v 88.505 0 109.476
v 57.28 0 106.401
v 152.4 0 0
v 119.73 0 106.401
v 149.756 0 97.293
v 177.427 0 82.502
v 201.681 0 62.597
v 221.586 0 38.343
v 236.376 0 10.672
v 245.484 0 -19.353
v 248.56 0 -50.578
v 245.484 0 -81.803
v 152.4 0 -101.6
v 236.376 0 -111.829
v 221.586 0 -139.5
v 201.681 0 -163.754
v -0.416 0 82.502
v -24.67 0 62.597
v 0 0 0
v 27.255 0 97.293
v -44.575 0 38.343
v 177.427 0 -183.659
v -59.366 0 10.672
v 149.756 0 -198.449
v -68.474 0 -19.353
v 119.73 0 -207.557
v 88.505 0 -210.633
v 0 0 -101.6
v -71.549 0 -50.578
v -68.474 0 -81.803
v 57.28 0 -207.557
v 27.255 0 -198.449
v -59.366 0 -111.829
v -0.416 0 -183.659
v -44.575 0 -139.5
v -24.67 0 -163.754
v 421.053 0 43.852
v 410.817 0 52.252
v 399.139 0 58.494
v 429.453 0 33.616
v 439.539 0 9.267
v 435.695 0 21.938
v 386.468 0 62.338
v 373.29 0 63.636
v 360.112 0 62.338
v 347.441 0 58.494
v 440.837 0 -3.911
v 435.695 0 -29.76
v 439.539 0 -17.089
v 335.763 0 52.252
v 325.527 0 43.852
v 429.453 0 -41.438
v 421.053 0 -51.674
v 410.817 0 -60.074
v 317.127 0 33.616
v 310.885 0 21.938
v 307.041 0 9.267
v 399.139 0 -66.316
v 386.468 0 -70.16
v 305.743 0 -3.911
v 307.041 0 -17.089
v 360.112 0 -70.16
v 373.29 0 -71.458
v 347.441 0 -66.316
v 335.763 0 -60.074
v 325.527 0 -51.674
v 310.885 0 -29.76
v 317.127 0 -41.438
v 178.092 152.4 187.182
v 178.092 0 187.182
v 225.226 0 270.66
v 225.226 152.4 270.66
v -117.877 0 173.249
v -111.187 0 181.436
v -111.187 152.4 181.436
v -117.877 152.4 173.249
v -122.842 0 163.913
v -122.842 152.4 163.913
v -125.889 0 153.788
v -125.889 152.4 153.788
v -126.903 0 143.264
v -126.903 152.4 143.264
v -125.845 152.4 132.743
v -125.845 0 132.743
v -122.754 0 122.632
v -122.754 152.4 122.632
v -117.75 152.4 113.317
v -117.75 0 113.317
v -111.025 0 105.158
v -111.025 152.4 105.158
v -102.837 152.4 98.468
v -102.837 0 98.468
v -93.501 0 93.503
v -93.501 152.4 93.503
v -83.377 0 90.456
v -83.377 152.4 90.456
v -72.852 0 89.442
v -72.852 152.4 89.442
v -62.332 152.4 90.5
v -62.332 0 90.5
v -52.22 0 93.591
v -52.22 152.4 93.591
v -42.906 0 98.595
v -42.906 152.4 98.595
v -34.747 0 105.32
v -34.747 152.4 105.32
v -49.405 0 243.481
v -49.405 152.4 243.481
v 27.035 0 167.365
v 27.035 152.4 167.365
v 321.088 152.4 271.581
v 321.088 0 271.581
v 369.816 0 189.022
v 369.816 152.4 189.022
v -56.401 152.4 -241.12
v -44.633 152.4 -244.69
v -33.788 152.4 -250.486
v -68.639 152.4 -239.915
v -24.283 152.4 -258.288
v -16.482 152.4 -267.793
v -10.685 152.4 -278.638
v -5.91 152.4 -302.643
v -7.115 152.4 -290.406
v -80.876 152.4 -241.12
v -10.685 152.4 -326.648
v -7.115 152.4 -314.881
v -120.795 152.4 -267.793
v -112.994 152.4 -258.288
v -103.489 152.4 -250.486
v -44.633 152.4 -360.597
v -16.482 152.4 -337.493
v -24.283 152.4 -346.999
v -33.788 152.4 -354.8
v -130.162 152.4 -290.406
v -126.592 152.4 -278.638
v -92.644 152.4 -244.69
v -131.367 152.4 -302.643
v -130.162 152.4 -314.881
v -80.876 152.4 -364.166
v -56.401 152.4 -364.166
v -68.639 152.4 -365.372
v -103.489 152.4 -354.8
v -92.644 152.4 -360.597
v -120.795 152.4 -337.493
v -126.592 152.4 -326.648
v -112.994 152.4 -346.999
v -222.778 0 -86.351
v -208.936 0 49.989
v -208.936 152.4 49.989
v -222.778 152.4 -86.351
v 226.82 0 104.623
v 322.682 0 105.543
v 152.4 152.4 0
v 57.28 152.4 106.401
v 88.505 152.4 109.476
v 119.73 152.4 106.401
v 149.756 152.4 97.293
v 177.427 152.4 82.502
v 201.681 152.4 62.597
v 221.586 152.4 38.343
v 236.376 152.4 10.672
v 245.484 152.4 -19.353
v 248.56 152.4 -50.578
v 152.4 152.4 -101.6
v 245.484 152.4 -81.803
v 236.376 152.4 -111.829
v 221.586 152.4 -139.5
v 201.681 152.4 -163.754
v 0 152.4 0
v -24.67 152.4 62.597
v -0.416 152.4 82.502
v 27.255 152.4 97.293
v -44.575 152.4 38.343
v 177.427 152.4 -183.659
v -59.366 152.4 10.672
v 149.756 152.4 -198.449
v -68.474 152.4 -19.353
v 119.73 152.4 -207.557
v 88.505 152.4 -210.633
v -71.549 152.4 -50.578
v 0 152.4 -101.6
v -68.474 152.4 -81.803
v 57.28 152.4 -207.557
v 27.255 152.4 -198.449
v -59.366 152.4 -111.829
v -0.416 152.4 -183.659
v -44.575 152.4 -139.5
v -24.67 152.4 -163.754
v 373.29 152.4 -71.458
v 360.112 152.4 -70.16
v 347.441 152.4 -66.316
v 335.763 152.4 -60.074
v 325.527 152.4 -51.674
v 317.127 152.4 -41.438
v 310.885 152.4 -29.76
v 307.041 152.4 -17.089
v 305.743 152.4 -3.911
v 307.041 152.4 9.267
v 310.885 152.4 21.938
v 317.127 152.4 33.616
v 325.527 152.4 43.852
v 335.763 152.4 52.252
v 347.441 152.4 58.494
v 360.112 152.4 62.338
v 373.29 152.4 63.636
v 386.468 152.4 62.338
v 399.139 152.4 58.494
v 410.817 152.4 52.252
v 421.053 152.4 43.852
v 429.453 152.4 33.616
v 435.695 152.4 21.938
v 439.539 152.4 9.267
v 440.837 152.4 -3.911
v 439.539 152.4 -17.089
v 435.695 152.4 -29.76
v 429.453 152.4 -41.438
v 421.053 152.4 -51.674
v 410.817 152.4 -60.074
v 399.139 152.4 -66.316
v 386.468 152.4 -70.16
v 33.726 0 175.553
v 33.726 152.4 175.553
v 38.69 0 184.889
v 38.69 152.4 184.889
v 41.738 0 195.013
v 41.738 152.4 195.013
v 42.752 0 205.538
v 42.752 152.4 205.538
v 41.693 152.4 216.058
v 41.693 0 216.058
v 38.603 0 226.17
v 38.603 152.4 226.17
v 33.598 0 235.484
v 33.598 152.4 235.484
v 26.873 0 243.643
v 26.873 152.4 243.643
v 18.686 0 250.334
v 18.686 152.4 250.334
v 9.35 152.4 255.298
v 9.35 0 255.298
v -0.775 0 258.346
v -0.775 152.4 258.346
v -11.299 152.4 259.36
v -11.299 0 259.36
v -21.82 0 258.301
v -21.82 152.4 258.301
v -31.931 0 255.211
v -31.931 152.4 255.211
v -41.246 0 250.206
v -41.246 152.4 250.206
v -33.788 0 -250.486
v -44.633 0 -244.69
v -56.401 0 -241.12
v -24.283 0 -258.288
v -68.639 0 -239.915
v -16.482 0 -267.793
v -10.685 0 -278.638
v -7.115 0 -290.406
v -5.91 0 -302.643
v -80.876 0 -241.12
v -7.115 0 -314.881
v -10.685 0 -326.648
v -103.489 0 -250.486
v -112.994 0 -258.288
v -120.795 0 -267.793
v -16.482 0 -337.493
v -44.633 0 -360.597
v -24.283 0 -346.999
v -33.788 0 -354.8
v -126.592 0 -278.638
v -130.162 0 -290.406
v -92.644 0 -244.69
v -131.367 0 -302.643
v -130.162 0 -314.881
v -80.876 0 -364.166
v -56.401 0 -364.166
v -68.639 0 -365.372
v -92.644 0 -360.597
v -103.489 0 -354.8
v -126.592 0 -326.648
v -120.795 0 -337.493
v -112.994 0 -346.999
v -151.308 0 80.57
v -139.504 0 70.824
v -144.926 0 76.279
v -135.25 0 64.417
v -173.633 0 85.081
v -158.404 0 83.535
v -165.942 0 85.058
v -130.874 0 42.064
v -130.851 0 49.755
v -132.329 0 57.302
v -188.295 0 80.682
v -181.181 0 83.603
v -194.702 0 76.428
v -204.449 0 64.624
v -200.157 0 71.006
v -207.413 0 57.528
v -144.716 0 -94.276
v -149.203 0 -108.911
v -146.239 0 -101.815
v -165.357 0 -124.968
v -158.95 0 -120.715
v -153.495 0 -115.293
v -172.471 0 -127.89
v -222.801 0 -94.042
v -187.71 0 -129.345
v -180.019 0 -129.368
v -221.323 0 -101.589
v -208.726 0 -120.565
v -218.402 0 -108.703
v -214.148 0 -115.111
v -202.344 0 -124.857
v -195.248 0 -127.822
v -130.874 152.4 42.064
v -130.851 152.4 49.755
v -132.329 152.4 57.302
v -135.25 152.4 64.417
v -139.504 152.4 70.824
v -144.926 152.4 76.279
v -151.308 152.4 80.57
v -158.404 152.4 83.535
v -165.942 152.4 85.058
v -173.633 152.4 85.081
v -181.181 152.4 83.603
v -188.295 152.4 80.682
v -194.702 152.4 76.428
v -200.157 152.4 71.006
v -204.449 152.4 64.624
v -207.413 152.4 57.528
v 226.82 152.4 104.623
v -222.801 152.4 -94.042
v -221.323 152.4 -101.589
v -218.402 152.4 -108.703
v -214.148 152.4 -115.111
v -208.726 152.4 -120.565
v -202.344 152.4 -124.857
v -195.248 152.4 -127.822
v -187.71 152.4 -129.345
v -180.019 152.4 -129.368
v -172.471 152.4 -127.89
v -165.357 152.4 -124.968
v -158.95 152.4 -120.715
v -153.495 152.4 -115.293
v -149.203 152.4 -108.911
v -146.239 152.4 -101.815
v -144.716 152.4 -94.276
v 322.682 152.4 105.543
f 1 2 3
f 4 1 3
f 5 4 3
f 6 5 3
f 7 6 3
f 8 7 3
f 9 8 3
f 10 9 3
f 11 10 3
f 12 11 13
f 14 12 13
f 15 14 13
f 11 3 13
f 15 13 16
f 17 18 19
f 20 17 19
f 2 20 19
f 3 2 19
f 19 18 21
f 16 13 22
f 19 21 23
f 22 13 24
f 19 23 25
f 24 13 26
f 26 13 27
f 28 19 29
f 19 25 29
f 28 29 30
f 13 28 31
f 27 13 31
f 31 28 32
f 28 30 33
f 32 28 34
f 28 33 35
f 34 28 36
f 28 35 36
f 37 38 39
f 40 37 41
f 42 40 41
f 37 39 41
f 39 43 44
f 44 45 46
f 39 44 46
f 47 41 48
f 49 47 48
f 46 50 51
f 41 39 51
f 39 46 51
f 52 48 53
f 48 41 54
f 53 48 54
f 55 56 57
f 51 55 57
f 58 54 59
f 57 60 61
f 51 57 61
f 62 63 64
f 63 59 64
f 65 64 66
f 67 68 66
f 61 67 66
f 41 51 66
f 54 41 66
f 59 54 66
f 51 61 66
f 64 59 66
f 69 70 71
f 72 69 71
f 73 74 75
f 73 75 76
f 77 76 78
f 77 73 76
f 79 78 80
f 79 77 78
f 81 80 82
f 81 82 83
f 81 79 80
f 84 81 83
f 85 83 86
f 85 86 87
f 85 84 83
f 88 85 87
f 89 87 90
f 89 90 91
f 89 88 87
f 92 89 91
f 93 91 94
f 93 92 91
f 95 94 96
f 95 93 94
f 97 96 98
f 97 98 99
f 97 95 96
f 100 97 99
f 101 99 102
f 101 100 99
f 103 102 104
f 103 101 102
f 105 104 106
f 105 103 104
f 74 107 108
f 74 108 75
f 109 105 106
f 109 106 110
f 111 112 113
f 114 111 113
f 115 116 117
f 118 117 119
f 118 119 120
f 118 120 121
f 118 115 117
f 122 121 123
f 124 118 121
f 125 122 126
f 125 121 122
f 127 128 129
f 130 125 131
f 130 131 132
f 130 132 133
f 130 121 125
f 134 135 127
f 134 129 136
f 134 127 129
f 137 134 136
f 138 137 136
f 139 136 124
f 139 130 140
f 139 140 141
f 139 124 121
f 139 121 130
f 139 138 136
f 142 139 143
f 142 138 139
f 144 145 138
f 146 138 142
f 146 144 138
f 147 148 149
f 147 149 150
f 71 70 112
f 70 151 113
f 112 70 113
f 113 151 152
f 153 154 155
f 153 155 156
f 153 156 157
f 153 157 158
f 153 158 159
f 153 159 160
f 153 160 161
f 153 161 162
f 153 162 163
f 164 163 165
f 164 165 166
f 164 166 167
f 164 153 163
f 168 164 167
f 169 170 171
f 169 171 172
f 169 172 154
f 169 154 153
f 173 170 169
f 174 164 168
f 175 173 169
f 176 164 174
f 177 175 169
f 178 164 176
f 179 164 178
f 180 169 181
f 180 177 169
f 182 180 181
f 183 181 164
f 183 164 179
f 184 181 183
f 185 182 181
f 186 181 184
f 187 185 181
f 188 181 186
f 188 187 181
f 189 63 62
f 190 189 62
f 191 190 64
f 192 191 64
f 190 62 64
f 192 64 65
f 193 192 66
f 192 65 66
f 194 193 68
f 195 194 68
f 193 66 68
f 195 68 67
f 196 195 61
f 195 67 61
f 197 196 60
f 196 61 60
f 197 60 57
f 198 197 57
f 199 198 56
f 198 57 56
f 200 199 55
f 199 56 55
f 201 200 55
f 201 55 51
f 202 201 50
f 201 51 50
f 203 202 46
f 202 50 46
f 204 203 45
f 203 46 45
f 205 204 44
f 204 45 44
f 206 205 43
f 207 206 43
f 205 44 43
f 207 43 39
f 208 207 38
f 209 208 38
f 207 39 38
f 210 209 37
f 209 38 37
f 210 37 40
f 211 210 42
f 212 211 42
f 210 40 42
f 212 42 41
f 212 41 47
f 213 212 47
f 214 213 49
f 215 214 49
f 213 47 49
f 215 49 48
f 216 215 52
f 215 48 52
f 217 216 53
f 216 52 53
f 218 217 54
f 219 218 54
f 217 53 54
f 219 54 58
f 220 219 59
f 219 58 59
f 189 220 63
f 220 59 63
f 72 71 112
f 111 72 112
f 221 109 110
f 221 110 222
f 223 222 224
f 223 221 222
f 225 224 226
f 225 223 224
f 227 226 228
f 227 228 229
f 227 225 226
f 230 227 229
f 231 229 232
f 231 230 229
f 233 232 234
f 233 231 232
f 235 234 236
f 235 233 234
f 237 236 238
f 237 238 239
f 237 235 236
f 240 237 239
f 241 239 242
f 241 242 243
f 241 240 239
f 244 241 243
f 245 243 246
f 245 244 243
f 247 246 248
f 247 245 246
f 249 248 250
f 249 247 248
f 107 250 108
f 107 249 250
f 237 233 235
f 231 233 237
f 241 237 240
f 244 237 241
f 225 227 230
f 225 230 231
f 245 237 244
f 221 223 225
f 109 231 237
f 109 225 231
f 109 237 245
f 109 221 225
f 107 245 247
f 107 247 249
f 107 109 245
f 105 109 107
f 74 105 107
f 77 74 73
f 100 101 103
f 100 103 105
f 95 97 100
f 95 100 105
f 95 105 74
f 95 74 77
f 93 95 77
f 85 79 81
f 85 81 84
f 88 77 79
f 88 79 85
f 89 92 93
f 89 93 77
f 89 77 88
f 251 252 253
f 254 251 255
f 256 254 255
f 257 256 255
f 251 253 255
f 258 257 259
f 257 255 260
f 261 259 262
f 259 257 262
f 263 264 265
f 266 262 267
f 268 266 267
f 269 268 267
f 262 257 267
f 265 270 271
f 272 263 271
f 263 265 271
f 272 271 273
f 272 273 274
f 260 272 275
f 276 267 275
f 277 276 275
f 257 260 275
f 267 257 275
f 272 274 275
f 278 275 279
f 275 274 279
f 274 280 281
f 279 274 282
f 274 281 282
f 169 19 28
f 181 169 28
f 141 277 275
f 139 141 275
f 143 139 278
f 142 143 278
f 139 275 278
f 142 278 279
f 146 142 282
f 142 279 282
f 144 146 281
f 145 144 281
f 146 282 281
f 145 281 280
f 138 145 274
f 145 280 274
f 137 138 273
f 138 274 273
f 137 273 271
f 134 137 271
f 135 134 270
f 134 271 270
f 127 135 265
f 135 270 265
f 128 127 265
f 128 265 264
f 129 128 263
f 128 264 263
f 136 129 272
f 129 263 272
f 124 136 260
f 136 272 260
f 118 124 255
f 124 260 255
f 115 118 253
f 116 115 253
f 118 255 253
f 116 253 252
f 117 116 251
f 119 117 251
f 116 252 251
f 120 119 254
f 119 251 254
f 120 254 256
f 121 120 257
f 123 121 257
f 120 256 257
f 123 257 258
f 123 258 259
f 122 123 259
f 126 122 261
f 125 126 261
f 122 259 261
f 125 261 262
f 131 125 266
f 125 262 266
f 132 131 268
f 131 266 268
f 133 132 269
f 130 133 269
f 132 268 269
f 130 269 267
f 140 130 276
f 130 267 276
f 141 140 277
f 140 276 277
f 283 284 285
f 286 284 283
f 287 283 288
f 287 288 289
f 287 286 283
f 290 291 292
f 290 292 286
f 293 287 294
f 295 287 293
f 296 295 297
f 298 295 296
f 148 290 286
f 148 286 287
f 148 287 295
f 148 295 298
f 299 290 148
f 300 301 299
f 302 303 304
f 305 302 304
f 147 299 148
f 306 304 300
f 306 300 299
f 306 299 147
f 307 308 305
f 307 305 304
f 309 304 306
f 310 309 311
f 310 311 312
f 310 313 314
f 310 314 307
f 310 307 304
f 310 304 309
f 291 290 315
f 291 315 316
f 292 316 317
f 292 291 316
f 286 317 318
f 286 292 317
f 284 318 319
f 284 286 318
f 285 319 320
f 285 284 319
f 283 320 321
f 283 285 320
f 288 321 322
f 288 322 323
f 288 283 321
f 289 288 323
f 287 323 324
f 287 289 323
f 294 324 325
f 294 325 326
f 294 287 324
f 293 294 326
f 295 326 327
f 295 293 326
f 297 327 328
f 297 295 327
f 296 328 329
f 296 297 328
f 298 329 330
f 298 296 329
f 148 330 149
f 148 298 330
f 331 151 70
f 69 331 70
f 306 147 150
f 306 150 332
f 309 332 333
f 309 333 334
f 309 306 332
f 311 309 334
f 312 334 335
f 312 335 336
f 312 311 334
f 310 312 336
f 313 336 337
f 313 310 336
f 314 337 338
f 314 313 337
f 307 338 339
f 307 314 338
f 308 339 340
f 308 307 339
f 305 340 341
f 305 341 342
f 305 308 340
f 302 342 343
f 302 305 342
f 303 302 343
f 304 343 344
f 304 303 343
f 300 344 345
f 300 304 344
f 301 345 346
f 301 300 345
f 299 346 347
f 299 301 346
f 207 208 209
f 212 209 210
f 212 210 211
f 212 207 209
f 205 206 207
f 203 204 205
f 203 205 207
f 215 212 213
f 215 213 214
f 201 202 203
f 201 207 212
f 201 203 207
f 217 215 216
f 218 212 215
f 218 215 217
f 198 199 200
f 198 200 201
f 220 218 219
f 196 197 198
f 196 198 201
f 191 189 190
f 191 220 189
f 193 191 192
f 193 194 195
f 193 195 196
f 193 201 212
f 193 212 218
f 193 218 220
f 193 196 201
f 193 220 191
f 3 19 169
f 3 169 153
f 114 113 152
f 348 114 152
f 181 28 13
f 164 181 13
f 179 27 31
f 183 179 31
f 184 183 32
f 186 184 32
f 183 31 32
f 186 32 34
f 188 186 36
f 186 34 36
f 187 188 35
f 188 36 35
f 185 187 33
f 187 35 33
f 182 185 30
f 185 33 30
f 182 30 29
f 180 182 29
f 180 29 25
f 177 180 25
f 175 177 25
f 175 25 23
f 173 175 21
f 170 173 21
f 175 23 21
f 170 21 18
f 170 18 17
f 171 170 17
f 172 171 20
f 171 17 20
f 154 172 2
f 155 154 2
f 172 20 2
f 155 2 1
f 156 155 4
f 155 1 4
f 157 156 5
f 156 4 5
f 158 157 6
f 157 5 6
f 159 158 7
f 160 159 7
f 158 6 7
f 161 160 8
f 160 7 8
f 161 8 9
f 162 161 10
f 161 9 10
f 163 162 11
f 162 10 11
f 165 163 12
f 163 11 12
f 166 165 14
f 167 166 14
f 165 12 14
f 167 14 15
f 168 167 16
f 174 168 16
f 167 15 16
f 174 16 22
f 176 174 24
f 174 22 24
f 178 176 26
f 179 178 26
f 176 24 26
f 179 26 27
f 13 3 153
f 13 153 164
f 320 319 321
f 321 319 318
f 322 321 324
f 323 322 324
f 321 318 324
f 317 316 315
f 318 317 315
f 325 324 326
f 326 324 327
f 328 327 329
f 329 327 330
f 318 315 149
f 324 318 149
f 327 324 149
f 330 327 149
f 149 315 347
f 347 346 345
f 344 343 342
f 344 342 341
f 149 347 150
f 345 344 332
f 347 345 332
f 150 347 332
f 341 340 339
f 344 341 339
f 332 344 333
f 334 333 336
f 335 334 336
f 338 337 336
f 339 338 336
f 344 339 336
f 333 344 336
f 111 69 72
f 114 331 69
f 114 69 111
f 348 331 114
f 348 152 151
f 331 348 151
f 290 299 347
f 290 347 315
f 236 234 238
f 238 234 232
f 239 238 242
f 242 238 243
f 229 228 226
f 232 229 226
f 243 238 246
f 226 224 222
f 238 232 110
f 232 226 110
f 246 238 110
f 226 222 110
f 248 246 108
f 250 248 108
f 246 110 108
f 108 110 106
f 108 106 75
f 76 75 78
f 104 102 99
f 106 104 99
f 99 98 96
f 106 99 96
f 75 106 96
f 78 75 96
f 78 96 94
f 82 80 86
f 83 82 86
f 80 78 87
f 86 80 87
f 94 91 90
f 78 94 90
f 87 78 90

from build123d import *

# Parameters (mm, degrees)
SKETCH1_R             = 160.054383024
SKETCH1_W             = 152.4
SKETCH1_H             = 101.6
BOSS_EXTRUDE1_DEPTH   = 152.4
SKETCH1_R_2           = 67.546599545
BOSS_EXTRUDE1_2_DEPTH = 152.4
SKETCH1_R_3           = 62.72842728
BOSS_EXTRUDE1_3_DEPTH = 152.4
BOSS_EXTRUDE1_4_DEPTH = 152.4
BOSS_EXTRUDE1_5_DEPTH = 152.4
BOSS_EXTRUDE1_6_DEPTH = 152.4


with BuildPart() as part:
    # Sketch1 → Boss-Extrude1 (new body)
    with BuildSketch(Plane(origin=(0, 0, 0), x_dir=(1, 0, 0), z_dir=(0, 1, 0))):
        with Locations(Location((88.50543124, 50.578437179, 0), (0, 0, 90))):
            Circle(SKETCH1_R)
        with Locations((76.2, 50.8)):
            Rectangle(SKETCH1_W, SKETCH1_H, mode=Mode.SUBTRACT)
    extrude(amount=BOSS_EXTRUDE1_DEPTH)


with BuildPart() as body_2:
    # Sketch1 → Boss-Extrude1 2 (new body)
    with BuildSketch(Plane(origin=(0, 0, 0), x_dir=(1, 0, 0), z_dir=(0, 1, 0))):
        with Locations(Location((373.289947205, 3.911024814, 0), (0, 0, 90))):
            Circle(SKETCH1_R_2)
    extrude(amount=BOSS_EXTRUDE1_2_DEPTH)


with BuildPart() as body_3:
    # Sketch1 → Boss-Extrude1 3 (new body)
    with BuildSketch(Plane(origin=(0, 0, 0), x_dir=(1, 0, 0), z_dir=(0, 1, 0))):
        with Locations(Location((-68.638535942, 302.643214026, 0), (0, 0, 90))):
            Circle(SKETCH1_R_3)
    extrude(amount=BOSS_EXTRUDE1_3_DEPTH)


with BuildPart() as body_4:
    # Sketch1 → Boss-Extrude1 4 (new body)
    with BuildSketch(Plane(origin=(0, 0, 0), x_dir=(1, 0, 0), z_dir=(0, 1, 0))):
        Polygon((225.22648648, -270.660475239), (321.088205207, -271.580508421), (369.815836678, -189.021841345), (322.681749423, -105.543141086), (226.820030696, -104.623107904), (178.092399225, -187.18177498), align=None)
    extrude(amount=BOSS_EXTRUDE1_4_DEPTH)


with BuildPart() as body_5:
    # Sketch1 → Boss-Extrude1 5 (new body)
    with BuildSketch(Plane(origin=(0, 0, 0), x_dir=(1, 0, 0), z_dir=(0, 1, 0))):
        with BuildLine():
            Line((-144.715826236, 94.276120946), (-130.873948783, -42.06424919))
            ThreePointArc((-130.873948783, -42.06424919), (-165.942443278, -85.057964519), (-208.936158607, -49.989470025))
            Line((-208.936158607, -49.989470025), (-222.77803606, 86.350900111))
            ThreePointArc((-222.77803606, 86.350900111), (-187.709541566, 129.344615441), (-144.715826236, 94.276120946))
        make_face()
    extrude(amount=BOSS_EXTRUDE1_5_DEPTH)


with BuildPart() as body_6:
    # Sketch1 → Boss-Extrude1 6 (new body)
    with BuildSketch(Plane(origin=(0, 0, 0), x_dir=(1, 0, 0), z_dir=(0, 1, 0))):
        with BuildLine():
            Line((-49.404670277, -243.481375716), (-111.18669851, -181.436163559))
            ThreePointArc((-111.18669851, -181.436163559), (-111.024576314, -105.15816066), (-34.746573415, -105.320282856))
            Line((-34.746573415, -105.320282856), (27.035454818, -167.365495014))
            ThreePointArc((27.035454818, -167.365495014), (26.873332621, -243.643497912), (-49.404670277, -243.481375716))
        make_face()
    extrude(amount=BOSS_EXTRUDE1_6_DEPTH)


solid = Compound([part.part, body_2.part, body_3.part, body_4.part, body_5.part, body_6.part])
